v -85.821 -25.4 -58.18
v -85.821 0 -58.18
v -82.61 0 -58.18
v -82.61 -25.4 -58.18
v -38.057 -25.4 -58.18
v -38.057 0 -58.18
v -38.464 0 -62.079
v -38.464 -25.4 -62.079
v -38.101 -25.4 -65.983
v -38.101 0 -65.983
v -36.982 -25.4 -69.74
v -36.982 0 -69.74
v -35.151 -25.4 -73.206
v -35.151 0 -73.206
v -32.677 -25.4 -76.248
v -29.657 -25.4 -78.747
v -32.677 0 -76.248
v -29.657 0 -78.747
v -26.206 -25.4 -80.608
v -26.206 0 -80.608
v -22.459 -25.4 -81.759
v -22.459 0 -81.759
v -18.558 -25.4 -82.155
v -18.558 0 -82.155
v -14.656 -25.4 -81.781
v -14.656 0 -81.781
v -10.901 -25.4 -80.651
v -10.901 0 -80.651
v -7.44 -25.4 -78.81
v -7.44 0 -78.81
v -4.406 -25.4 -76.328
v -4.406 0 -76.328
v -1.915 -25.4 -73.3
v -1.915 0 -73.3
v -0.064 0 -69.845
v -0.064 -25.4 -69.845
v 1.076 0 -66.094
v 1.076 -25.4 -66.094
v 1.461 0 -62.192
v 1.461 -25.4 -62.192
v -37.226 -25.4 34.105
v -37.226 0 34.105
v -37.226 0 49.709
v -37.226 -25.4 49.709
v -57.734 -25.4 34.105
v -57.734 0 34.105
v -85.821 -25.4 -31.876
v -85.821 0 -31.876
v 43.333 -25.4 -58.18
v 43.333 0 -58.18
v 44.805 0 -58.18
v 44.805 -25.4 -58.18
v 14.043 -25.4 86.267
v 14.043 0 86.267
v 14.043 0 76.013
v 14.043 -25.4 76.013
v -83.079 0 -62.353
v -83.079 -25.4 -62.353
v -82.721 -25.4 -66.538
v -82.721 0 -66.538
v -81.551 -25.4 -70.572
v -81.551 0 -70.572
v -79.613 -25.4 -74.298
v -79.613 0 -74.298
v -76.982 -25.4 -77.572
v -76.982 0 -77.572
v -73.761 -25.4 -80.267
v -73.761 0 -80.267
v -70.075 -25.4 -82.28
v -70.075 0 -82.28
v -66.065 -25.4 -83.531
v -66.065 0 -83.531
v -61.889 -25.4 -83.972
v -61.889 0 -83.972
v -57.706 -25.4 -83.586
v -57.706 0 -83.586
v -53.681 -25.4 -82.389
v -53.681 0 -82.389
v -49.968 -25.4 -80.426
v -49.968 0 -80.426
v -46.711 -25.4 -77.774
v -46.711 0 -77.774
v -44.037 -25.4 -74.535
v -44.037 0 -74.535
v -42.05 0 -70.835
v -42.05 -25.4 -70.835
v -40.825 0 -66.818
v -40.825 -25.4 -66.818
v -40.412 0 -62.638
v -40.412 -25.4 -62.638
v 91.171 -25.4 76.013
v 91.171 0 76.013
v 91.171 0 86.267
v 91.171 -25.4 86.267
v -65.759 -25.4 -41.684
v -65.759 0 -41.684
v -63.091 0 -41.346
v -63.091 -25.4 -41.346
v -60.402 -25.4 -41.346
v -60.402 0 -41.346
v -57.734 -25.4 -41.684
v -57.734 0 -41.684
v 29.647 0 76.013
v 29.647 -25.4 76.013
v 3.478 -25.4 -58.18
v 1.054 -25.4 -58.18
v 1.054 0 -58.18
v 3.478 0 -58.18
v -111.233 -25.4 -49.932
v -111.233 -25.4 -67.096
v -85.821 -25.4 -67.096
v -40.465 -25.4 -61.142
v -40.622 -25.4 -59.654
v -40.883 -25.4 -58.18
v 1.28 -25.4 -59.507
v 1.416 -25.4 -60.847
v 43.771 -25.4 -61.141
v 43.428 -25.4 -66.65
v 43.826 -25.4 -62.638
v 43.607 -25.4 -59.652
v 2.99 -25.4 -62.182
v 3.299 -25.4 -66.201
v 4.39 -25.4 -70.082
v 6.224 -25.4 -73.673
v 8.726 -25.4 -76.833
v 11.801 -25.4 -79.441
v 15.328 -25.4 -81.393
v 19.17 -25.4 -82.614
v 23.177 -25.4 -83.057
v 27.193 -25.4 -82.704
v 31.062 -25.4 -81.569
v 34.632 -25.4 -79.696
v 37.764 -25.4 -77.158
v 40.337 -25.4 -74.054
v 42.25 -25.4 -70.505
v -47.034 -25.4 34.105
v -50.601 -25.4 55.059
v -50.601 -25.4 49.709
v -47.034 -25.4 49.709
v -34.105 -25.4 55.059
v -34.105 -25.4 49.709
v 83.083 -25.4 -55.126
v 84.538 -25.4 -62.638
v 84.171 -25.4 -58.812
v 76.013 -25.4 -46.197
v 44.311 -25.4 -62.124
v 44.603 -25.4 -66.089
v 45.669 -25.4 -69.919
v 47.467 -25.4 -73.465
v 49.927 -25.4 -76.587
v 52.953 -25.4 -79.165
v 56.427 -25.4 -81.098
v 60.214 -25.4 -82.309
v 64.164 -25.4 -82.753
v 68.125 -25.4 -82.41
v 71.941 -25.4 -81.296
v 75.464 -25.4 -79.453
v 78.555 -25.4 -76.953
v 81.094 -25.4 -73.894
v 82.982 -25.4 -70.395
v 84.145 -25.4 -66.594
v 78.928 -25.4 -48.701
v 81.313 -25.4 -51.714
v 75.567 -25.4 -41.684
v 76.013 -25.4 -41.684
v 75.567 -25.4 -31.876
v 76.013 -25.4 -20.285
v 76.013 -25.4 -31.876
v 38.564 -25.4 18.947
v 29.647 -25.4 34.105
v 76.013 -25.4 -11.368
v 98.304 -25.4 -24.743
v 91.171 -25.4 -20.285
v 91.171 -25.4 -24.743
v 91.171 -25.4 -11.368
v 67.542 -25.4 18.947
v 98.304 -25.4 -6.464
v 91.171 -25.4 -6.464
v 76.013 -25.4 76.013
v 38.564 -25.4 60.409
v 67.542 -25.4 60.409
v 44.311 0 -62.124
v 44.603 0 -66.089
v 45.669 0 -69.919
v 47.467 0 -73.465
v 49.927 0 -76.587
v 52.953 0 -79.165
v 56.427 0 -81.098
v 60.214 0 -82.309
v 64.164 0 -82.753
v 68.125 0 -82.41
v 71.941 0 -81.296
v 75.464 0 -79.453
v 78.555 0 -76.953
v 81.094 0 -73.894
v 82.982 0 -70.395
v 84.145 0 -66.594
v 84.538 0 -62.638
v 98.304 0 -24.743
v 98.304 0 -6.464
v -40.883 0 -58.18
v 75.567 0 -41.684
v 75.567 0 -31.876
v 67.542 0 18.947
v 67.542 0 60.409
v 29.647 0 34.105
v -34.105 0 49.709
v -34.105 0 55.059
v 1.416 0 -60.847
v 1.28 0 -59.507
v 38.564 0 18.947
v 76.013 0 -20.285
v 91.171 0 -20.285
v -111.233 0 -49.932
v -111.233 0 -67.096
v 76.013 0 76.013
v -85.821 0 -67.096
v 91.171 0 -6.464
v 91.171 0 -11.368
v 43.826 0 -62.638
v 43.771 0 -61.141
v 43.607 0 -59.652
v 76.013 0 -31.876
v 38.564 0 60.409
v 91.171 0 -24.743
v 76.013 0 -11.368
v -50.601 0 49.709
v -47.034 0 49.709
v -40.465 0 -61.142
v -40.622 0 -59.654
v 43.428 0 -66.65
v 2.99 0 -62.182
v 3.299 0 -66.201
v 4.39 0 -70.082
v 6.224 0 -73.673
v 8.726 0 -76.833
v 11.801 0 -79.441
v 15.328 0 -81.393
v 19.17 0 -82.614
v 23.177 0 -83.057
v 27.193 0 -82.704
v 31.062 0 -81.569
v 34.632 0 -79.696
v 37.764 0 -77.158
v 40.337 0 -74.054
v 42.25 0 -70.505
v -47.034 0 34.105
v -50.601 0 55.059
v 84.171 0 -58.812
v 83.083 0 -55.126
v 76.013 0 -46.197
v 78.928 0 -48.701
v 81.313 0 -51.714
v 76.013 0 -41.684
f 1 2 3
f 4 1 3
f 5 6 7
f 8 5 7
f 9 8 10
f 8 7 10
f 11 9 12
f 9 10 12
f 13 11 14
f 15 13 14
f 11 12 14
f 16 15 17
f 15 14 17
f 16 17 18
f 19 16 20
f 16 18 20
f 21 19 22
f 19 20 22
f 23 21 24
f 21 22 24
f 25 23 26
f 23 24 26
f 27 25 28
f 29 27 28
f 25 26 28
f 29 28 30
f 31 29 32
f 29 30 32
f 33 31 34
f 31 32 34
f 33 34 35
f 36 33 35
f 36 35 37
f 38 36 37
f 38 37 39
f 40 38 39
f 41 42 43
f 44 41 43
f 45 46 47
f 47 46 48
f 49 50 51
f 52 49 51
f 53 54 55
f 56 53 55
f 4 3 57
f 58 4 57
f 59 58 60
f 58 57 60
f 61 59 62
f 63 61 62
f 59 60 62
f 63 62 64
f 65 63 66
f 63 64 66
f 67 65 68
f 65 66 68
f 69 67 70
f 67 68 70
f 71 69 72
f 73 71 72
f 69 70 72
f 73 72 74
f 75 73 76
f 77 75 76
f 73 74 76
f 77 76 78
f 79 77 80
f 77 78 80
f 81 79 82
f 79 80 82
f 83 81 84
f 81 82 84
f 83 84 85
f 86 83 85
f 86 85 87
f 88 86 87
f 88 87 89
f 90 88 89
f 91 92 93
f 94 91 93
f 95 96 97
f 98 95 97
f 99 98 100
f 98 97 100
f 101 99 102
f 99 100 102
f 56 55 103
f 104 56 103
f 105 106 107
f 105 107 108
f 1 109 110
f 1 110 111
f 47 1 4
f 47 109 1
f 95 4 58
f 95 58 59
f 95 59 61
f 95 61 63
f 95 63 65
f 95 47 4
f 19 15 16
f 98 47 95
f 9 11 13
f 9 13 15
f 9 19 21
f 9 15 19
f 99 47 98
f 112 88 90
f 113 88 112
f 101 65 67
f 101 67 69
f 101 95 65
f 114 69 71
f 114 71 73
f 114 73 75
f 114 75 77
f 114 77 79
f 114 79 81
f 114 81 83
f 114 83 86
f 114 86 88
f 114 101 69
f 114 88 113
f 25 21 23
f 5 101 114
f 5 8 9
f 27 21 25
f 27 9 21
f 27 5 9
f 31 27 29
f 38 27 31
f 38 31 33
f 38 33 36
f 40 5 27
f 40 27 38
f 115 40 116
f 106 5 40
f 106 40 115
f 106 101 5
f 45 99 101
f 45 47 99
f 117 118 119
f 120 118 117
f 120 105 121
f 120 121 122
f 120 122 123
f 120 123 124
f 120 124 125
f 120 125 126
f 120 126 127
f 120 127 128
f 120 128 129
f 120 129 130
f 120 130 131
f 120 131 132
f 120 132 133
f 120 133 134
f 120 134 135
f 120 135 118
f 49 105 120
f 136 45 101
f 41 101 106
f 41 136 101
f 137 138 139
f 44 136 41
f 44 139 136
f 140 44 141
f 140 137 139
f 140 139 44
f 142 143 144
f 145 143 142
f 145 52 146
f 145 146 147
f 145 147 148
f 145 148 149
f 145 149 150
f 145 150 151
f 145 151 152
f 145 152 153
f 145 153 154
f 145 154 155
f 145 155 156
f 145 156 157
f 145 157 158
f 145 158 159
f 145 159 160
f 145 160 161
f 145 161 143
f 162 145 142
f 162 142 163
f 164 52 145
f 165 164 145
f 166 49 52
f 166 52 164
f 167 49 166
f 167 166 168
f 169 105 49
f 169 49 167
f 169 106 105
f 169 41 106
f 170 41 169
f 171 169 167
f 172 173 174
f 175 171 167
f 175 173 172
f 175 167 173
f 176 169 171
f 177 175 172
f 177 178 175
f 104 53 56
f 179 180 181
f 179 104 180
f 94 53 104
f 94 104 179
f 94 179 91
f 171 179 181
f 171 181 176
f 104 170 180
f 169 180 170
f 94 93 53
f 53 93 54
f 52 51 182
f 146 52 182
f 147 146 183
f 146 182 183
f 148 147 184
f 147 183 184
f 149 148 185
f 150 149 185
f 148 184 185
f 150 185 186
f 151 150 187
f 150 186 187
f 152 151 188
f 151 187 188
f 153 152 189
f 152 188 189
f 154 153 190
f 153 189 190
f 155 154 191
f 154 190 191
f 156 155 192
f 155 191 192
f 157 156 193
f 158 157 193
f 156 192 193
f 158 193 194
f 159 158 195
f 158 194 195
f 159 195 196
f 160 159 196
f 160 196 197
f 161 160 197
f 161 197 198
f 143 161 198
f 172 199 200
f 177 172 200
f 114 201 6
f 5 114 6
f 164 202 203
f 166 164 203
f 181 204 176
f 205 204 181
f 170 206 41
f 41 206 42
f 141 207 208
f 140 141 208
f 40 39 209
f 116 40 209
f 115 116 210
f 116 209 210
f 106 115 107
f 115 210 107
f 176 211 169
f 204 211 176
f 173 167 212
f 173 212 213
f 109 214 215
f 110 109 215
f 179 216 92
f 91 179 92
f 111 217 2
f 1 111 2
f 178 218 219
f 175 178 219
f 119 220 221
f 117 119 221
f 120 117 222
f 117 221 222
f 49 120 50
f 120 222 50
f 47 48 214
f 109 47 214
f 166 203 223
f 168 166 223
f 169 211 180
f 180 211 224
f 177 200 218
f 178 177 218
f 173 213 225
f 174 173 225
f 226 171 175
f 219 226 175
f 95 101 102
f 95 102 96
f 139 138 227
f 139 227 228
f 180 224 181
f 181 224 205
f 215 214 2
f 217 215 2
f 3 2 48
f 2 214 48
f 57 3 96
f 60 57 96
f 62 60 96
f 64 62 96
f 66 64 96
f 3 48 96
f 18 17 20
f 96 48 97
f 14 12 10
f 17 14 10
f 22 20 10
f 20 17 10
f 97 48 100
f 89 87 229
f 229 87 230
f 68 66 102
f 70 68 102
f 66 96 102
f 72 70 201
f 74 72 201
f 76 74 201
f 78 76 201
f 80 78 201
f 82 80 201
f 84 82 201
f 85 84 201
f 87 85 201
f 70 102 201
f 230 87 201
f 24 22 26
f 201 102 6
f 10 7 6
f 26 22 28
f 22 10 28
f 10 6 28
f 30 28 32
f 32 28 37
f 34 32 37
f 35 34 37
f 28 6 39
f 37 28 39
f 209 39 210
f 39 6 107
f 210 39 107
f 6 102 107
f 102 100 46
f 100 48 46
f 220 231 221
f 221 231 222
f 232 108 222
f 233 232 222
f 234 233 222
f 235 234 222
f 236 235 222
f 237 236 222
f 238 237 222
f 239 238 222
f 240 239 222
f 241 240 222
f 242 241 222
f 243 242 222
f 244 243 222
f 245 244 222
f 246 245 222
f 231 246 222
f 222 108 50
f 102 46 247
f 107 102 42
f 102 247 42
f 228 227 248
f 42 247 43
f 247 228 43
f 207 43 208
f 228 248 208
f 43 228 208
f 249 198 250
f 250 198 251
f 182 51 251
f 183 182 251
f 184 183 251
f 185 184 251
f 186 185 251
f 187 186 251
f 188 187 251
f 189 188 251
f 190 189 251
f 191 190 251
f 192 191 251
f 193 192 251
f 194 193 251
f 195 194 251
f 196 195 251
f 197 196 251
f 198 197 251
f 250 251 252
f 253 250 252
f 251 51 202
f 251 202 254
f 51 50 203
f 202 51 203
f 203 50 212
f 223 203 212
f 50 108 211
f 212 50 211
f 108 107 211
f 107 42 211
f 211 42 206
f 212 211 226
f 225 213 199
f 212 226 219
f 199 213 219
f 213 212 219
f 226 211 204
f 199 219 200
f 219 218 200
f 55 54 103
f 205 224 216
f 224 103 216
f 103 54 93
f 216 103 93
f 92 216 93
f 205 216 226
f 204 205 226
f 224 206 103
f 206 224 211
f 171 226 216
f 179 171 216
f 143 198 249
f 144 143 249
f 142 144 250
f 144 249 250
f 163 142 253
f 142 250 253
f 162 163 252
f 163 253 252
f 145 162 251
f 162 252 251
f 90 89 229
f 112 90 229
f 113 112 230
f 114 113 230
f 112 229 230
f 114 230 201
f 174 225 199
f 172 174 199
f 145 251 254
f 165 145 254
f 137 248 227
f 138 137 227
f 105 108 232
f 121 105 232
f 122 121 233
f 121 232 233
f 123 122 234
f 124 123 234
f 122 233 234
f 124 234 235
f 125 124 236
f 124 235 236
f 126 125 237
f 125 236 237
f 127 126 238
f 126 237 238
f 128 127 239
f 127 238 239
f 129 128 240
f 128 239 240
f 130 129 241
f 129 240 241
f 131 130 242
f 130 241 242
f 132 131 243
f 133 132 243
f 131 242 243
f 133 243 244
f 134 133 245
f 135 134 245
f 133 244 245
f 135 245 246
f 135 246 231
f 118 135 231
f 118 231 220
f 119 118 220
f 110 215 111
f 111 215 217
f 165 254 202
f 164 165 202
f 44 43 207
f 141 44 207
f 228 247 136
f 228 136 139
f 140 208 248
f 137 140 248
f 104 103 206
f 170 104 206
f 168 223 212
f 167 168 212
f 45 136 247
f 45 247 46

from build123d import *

# Parameters (mm, degrees)
F0_W     = 9.8080858588
F0_H     = 15.6037732959
F0_W_2   = 28.9784371853
F0_H_2   = 41.4614528418
F0_W_3   = 15.1579454541
F0_H_3   = 8.9164413512
F1_DEPTH = 25.4


with BuildPart() as f1:
    # F0 (on Front) → F1 (new body)
    with BuildSketch(Plane.XZ):
        Polygon((-47.0342300832, 34.1053940356), (-57.7339567244, 34.1053940356), (-57.7339567244, -31.8762771785), (29.6471677721, -31.8762771785), (29.6471677721, 34.1053940356), (-37.2261442244, 34.1053940356), align=None)
        Polygon((-57.7339567244, -31.8762771785), (-57.7339567244, 34.1053940356), (-85.820749402, -31.8762771785), align=None)
        with Locations((-42.1301871538, 41.9072806835)):
            Rectangle(F0_W, F0_H)
        with BuildLine():
            Line((29.6471677721, -31.8762771785), (-57.7339567244, -31.8762771785))
            Line((-57.7339567244, -31.8762771785), (-85.820749402, -31.8762771785))
            Line((-85.820749402, -31.8762771785), (-85.820749402, -41.6843593121))
            Line((-85.820749402, -41.6843593121), (-65.7587572932, -41.6843593121))
            ThreePointArc((-65.7587572932, -41.6843593121), (-61.7463588715, -41.3036522536), (-57.7339604497, -41.6843593121))
            Line((-57.7339604497, -41.6843593121), (75.566843152, -41.6843593121))
            Line((75.566843152, -41.6843593121), (75.566843152, -31.8762771785))
            Line((75.566843152, -31.8762771785), (29.6471677721, -31.8762771785))
        make_face()
        Polygon((-85.820749402, -41.6843593121), (-85.820749402, -31.8762771785), (-111.2326085567, -49.9320700765), (-85.820749402, -49.9320700765), align=None)
        Polygon((-50.6008081138, 49.7091673315), (-47.0342300832, 49.7091673315), (-37.2261442244, 49.7091673315), (-34.1053903103, 49.7091673315), (-34.1053903103, 55.059030652), (-50.6008081138, 55.059030652), align=None)
        Polygon((29.6471677721, 34.1053940356), (29.6471677721, -31.8762771785), (75.566843152, -31.8762771785), (76.0126635432, -31.8762771785), (76.0126635432, -20.2849023044), (76.0126635432, -11.3684609532), (76.0126635432, 76.0126635432), (29.6471677721, 76.0126635432), align=None)
        with Locations((53.0528277159, 39.6781675518)):
            Rectangle(F0_W_2, F0_H_2, mode=Mode.SUBTRACT)
        with BuildLine():
            Line((-65.7587572932, -41.6843593121), (-85.820749402, -41.6843593121))
            Line((-85.820749402, -41.6843593121), (-85.820749402, -49.9320700765))
            Line((-85.820749402, -49.9320700765), (-85.820749402, -58.1797808409))
            Line((-85.820749402, -58.1797808409), (-82.6096979015, -58.1797808409))
            ThreePointArc((-82.6096979015, -58.1797808409), (-76.6703433025, -47.3923721355), (-65.7587572932, -41.6843593121))
        make_face()
        Polygon((-85.820749402, -49.9320700765), (-111.2326085567, -49.9320700765), (-111.2326085567, -67.0962259173), (-85.820749402, -67.0962259173), (-85.820749402, -58.1797808409), align=None)
        with BuildLine():
            Line((-57.7339604497, -41.6843593121), (-65.7587572932, -41.6843593121))
            ThreePointArc((-65.7587572932, -41.6843593121), (-76.6703433025, -47.3923721355), (-82.6096979015, -58.1797808409))
            Line((-82.6096979015, -58.1797808409), (-40.8830198414, -58.1797808409))
            ThreePointArc((-40.8830198414, -58.1797808409), (-46.8223744405, -47.3923721355), (-57.7339604497, -41.6843593121))
        make_face()
        Polygon((14.0433991328, 76.0126635432), (29.6471677721, 76.0126635432), (76.0126635432, 76.0126635432), (91.1706089973, 76.0126635432), (91.1706089973, 86.2665772438), (14.0433991328, 86.2665772438), align=None)
        with BuildLine():
            Line((76.0126635432, -41.6843593121), (75.566843152, -41.6843593121))
            Line((75.566843152, -41.6843593121), (-57.7339604497, -41.6843593121))
            ThreePointArc((-57.7339604497, -41.6843593121), (-46.8223744405, -47.3923721355), (-40.8830198414, -58.1797808409))
            Line((-40.8830198414, -58.1797808409), (-38.0569003573, -58.1797808409))
            ThreePointArc((-38.0569003573, -58.1797808409), (-18.5016151518, -42.2295010715), (1.0536700538, -58.1797808409))
            Line((1.0536700538, -58.1797808409), (3.4778552674, -58.1797808409))
            ThreePointArc((3.4778552674, -58.1797808409), (23.4056599438, -42.2175962213), (43.3334646202, -58.1797808409))
            Line((43.3334646202, -58.1797808409), (44.805124402, -58.1797808409))
            ThreePointArc((44.805124402, -58.1797808409), (57.210420743, -43.8584153697), (76.0126635432, -46.19690889))
            Line((76.0126635432, -46.19690889), (76.0126635432, -41.6843593121))
        make_face()
        with BuildLine():
            Line((-40.8830198414, -58.1797808409), (-82.6096979015, -58.1797808409))
            ThreePointArc((-82.6096979015, -58.1797808409), (-63.9878782959, -83.8542812252), (-40.4120040206, -62.6380071044))
            ThreePointArc((-40.4120040206, -62.6380071044), (-40.5300847506, -60.39648768), (-40.8830198414, -58.1797808409))
        make_face()
        with Locations((83.5916362703, -15.8266816288)):
            Rectangle(F0_W_3, F0_H_3)
        Polygon((91.1706089973, -11.3684609532), (91.1706089973, -20.2849023044), (91.1706089973, -24.74312298), (98.3037799597, -24.74312298), (98.3037799597, -6.4644180238), (91.1706089973, -6.4644180238), align=None)
        with BuildLine():
            ThreePointArc((84.5376919751, -62.6380071044), (82.2797104052, -53.3780689261), (76.0126635432, -46.19690889))
            Line((76.0126635432, -46.19690889), (76.0126635432, -58.1797808409))
            Line((76.0126635432, -58.1797808409), (44.805124402, -58.1797808409))
            ThreePointArc((44.805124402, -58.1797808409), (62.1781869933, -82.6289594789), (84.5376919751, -62.6380071044))
        make_face()
        with BuildLine():
            Line((76.0126635432, -58.1797808409), (76.0126635432, -46.19690889))
            ThreePointArc((76.0126635432, -46.19690889), (57.210420743, -43.8584153697), (44.805124402, -58.1797808409))
            Line((44.805124402, -58.1797808409), (76.0126635432, -58.1797808409))
        make_face()
        with BuildLine():
            ThreePointArc((1.0536700538, -58.1797808409), (-18.5016151518, -42.2295010715), (-38.0569003573, -58.1797808409))
            Line((-38.0569003573, -58.1797808409), (1.0536700538, -58.1797808409))
        make_face()
        with BuildLine():
            Line((1.0536700538, -58.1797808409), (-38.0569003573, -58.1797808409))
            ThreePointArc((-38.0569003573, -58.1797808409), (-20.5181288599, -82.0527480619), (1.4610630394, -62.1921792626))
            ThreePointArc((1.4610630394, -62.1921792626), (1.3589536475, -60.1756655545), (1.0536700538, -58.1797808409))
        make_face()
        with BuildLine():
            ThreePointArc((43.826070827, -62.6380071044), (43.7025456671, -60.3953277754), (43.3334646202, -58.1797808409))
            Line((43.3334646202, -58.1797808409), (3.4778552674, -58.1797808409))
            ThreePointArc((3.4778552674, -58.1797808409), (21.1629806148, -82.9348928277), (43.826070827, -62.6380071044))
        make_face()
        with BuildLine():
            Line((3.4778552674, -58.1797808409), (43.3334646202, -58.1797808409))
            ThreePointArc((43.3334646202, -58.1797808409), (23.4056599438, -42.2175962213), (3.4778552674, -58.1797808409))
        make_face()
    extrude(amount=F1_DEPTH)


solid = f1.part
